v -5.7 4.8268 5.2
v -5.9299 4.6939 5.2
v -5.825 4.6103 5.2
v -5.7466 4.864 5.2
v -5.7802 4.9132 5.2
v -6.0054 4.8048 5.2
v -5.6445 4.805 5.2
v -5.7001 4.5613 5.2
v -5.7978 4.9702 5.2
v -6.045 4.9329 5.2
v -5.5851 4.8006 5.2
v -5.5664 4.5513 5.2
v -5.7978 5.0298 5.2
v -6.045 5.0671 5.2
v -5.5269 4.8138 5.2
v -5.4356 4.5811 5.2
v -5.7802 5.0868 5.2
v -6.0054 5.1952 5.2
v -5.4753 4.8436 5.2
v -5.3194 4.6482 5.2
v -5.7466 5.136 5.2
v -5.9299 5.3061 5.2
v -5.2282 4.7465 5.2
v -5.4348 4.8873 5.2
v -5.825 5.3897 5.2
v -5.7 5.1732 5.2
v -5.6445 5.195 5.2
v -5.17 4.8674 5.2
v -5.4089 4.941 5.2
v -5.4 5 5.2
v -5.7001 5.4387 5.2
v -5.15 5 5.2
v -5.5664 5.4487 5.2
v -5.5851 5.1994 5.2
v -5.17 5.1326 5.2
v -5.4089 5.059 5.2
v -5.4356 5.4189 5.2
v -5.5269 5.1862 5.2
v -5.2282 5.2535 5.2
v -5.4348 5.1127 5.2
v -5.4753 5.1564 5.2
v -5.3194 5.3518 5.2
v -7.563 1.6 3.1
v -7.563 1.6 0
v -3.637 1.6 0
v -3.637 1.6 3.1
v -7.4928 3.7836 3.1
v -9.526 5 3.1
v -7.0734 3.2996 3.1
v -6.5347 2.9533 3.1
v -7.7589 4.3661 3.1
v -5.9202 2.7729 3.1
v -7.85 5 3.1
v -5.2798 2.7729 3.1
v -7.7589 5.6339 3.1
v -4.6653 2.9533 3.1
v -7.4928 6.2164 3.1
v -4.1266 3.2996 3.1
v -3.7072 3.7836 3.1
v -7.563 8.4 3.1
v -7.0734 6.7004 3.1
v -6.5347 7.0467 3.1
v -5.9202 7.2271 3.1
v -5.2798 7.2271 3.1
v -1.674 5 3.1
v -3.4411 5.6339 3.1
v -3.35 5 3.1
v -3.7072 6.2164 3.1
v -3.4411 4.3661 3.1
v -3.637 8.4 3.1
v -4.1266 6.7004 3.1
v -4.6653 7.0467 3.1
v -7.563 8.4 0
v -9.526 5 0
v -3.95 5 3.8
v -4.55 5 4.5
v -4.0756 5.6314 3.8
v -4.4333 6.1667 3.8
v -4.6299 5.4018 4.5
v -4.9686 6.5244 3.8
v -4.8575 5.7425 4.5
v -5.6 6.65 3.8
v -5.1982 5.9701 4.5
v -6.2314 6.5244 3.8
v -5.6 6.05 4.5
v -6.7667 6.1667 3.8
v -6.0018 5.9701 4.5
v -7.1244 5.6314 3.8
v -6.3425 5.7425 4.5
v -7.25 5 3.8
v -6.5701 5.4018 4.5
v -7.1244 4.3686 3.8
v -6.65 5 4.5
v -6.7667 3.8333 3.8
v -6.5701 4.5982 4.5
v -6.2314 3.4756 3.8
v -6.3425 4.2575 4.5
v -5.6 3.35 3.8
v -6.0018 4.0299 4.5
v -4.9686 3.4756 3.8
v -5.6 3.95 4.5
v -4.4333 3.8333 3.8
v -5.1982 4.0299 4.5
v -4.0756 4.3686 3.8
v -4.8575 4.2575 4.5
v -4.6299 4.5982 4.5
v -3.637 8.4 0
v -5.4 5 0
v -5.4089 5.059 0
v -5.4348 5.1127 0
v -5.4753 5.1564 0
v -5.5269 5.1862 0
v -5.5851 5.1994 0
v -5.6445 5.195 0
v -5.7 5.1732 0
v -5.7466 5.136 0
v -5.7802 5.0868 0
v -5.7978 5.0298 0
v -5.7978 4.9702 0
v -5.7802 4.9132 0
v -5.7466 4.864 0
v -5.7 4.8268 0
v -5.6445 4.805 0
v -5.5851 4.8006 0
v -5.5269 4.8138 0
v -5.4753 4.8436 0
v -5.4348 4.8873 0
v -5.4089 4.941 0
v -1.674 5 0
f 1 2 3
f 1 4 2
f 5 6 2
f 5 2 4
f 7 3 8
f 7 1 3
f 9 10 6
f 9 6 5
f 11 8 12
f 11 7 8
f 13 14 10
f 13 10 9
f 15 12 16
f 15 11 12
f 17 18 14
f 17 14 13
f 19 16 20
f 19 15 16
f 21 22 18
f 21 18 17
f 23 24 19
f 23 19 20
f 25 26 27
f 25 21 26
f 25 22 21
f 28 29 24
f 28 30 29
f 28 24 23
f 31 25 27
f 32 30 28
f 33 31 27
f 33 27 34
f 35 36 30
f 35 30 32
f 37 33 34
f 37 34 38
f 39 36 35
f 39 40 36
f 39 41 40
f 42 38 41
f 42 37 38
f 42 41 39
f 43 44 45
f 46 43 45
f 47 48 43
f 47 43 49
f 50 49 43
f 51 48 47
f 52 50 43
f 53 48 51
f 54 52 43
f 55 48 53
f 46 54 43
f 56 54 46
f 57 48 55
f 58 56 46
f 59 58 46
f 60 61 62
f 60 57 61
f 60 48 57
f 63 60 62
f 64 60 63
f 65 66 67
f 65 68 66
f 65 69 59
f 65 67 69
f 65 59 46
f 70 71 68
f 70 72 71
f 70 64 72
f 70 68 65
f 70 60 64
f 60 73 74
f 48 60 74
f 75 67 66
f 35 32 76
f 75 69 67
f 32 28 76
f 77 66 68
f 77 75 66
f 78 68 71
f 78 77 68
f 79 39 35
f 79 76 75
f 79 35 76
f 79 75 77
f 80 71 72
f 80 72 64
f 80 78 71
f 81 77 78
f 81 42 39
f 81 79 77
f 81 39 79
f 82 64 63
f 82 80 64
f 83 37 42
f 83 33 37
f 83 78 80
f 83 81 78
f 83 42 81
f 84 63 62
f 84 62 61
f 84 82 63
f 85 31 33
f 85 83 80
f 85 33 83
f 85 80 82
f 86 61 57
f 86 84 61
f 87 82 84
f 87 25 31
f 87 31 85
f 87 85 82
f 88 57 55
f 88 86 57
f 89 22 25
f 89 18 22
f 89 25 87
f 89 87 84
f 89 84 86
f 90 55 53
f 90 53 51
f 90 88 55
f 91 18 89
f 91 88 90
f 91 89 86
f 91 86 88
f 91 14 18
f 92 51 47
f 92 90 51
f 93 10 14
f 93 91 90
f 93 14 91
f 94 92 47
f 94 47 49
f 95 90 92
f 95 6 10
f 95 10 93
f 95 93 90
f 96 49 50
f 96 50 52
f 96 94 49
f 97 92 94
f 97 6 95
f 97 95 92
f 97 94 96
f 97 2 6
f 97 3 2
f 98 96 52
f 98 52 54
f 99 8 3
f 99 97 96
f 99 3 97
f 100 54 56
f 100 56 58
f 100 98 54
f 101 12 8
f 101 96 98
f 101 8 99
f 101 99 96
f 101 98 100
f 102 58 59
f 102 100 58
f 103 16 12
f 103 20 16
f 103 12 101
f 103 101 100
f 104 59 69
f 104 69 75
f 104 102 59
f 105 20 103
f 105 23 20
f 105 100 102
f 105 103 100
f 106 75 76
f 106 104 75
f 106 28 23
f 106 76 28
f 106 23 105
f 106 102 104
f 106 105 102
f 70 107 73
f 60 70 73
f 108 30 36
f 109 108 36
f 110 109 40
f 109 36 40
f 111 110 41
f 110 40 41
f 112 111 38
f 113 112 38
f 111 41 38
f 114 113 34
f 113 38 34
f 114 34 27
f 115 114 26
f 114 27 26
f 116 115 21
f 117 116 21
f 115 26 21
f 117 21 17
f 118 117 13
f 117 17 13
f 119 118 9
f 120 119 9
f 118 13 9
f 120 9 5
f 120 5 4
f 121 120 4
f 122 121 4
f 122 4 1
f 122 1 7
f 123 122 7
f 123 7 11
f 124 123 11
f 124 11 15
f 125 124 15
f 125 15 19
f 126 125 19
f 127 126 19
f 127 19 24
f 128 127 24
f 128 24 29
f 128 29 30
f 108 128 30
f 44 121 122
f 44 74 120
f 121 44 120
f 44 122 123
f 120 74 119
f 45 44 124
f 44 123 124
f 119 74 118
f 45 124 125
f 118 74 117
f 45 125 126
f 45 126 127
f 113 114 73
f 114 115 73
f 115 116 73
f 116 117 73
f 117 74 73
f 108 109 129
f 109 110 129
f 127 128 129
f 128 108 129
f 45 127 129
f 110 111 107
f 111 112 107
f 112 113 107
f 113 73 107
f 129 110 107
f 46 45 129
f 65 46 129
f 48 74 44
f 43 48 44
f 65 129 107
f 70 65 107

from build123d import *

# Parameters (mm, degrees)
RESSALTO_EXTRUS_O1_DEPTH = 3.1
ESBO_O3_R                = 2.25
ESBO_O2_R                = 0.45
ESBO_O4_R                = 0.2
CORTE_EXTRUS_O1_DEPTH    = 6.2


with BuildPart() as part:
    # Esboço1 → Ressalto-extrusão1 (new body)
    with BuildSketch(Plane.XY):
        Polygon((-3.637009085, 1.6), (-1.67401817, 5), (-3.637009085, 8.4), (-7.562990915, 8.4), (-9.52598183, 5), (-7.562990915, 1.6), align=None)
    extrude(amount=RESSALTO_EXTRUS_O1_DEPTH)

    # Esboço3 → Loft3 section 0
    with BuildSketch(Plane.XY.offset(3.1)):
        with Locations((-5.6, 5)):
            Circle(ESBO_O3_R)
    # Esboço2 → Loft3 section 1
    with BuildSketch(Plane.XY.offset(5.2)):
        with Locations((-5.6, 5)):
            Circle(ESBO_O2_R)
    loft()

    # Esboço4 → Corte-extrusão1 (cut, through all)
    with BuildSketch(Plane.XY.offset(5.2)):
        with Locations((-5.6, 5)):
            Circle(ESBO_O4_R)
    extrude(amount=-CORTE_EXTRUS_O1_DEPTH, mode=Mode.SUBTRACT)


solid = part.part
